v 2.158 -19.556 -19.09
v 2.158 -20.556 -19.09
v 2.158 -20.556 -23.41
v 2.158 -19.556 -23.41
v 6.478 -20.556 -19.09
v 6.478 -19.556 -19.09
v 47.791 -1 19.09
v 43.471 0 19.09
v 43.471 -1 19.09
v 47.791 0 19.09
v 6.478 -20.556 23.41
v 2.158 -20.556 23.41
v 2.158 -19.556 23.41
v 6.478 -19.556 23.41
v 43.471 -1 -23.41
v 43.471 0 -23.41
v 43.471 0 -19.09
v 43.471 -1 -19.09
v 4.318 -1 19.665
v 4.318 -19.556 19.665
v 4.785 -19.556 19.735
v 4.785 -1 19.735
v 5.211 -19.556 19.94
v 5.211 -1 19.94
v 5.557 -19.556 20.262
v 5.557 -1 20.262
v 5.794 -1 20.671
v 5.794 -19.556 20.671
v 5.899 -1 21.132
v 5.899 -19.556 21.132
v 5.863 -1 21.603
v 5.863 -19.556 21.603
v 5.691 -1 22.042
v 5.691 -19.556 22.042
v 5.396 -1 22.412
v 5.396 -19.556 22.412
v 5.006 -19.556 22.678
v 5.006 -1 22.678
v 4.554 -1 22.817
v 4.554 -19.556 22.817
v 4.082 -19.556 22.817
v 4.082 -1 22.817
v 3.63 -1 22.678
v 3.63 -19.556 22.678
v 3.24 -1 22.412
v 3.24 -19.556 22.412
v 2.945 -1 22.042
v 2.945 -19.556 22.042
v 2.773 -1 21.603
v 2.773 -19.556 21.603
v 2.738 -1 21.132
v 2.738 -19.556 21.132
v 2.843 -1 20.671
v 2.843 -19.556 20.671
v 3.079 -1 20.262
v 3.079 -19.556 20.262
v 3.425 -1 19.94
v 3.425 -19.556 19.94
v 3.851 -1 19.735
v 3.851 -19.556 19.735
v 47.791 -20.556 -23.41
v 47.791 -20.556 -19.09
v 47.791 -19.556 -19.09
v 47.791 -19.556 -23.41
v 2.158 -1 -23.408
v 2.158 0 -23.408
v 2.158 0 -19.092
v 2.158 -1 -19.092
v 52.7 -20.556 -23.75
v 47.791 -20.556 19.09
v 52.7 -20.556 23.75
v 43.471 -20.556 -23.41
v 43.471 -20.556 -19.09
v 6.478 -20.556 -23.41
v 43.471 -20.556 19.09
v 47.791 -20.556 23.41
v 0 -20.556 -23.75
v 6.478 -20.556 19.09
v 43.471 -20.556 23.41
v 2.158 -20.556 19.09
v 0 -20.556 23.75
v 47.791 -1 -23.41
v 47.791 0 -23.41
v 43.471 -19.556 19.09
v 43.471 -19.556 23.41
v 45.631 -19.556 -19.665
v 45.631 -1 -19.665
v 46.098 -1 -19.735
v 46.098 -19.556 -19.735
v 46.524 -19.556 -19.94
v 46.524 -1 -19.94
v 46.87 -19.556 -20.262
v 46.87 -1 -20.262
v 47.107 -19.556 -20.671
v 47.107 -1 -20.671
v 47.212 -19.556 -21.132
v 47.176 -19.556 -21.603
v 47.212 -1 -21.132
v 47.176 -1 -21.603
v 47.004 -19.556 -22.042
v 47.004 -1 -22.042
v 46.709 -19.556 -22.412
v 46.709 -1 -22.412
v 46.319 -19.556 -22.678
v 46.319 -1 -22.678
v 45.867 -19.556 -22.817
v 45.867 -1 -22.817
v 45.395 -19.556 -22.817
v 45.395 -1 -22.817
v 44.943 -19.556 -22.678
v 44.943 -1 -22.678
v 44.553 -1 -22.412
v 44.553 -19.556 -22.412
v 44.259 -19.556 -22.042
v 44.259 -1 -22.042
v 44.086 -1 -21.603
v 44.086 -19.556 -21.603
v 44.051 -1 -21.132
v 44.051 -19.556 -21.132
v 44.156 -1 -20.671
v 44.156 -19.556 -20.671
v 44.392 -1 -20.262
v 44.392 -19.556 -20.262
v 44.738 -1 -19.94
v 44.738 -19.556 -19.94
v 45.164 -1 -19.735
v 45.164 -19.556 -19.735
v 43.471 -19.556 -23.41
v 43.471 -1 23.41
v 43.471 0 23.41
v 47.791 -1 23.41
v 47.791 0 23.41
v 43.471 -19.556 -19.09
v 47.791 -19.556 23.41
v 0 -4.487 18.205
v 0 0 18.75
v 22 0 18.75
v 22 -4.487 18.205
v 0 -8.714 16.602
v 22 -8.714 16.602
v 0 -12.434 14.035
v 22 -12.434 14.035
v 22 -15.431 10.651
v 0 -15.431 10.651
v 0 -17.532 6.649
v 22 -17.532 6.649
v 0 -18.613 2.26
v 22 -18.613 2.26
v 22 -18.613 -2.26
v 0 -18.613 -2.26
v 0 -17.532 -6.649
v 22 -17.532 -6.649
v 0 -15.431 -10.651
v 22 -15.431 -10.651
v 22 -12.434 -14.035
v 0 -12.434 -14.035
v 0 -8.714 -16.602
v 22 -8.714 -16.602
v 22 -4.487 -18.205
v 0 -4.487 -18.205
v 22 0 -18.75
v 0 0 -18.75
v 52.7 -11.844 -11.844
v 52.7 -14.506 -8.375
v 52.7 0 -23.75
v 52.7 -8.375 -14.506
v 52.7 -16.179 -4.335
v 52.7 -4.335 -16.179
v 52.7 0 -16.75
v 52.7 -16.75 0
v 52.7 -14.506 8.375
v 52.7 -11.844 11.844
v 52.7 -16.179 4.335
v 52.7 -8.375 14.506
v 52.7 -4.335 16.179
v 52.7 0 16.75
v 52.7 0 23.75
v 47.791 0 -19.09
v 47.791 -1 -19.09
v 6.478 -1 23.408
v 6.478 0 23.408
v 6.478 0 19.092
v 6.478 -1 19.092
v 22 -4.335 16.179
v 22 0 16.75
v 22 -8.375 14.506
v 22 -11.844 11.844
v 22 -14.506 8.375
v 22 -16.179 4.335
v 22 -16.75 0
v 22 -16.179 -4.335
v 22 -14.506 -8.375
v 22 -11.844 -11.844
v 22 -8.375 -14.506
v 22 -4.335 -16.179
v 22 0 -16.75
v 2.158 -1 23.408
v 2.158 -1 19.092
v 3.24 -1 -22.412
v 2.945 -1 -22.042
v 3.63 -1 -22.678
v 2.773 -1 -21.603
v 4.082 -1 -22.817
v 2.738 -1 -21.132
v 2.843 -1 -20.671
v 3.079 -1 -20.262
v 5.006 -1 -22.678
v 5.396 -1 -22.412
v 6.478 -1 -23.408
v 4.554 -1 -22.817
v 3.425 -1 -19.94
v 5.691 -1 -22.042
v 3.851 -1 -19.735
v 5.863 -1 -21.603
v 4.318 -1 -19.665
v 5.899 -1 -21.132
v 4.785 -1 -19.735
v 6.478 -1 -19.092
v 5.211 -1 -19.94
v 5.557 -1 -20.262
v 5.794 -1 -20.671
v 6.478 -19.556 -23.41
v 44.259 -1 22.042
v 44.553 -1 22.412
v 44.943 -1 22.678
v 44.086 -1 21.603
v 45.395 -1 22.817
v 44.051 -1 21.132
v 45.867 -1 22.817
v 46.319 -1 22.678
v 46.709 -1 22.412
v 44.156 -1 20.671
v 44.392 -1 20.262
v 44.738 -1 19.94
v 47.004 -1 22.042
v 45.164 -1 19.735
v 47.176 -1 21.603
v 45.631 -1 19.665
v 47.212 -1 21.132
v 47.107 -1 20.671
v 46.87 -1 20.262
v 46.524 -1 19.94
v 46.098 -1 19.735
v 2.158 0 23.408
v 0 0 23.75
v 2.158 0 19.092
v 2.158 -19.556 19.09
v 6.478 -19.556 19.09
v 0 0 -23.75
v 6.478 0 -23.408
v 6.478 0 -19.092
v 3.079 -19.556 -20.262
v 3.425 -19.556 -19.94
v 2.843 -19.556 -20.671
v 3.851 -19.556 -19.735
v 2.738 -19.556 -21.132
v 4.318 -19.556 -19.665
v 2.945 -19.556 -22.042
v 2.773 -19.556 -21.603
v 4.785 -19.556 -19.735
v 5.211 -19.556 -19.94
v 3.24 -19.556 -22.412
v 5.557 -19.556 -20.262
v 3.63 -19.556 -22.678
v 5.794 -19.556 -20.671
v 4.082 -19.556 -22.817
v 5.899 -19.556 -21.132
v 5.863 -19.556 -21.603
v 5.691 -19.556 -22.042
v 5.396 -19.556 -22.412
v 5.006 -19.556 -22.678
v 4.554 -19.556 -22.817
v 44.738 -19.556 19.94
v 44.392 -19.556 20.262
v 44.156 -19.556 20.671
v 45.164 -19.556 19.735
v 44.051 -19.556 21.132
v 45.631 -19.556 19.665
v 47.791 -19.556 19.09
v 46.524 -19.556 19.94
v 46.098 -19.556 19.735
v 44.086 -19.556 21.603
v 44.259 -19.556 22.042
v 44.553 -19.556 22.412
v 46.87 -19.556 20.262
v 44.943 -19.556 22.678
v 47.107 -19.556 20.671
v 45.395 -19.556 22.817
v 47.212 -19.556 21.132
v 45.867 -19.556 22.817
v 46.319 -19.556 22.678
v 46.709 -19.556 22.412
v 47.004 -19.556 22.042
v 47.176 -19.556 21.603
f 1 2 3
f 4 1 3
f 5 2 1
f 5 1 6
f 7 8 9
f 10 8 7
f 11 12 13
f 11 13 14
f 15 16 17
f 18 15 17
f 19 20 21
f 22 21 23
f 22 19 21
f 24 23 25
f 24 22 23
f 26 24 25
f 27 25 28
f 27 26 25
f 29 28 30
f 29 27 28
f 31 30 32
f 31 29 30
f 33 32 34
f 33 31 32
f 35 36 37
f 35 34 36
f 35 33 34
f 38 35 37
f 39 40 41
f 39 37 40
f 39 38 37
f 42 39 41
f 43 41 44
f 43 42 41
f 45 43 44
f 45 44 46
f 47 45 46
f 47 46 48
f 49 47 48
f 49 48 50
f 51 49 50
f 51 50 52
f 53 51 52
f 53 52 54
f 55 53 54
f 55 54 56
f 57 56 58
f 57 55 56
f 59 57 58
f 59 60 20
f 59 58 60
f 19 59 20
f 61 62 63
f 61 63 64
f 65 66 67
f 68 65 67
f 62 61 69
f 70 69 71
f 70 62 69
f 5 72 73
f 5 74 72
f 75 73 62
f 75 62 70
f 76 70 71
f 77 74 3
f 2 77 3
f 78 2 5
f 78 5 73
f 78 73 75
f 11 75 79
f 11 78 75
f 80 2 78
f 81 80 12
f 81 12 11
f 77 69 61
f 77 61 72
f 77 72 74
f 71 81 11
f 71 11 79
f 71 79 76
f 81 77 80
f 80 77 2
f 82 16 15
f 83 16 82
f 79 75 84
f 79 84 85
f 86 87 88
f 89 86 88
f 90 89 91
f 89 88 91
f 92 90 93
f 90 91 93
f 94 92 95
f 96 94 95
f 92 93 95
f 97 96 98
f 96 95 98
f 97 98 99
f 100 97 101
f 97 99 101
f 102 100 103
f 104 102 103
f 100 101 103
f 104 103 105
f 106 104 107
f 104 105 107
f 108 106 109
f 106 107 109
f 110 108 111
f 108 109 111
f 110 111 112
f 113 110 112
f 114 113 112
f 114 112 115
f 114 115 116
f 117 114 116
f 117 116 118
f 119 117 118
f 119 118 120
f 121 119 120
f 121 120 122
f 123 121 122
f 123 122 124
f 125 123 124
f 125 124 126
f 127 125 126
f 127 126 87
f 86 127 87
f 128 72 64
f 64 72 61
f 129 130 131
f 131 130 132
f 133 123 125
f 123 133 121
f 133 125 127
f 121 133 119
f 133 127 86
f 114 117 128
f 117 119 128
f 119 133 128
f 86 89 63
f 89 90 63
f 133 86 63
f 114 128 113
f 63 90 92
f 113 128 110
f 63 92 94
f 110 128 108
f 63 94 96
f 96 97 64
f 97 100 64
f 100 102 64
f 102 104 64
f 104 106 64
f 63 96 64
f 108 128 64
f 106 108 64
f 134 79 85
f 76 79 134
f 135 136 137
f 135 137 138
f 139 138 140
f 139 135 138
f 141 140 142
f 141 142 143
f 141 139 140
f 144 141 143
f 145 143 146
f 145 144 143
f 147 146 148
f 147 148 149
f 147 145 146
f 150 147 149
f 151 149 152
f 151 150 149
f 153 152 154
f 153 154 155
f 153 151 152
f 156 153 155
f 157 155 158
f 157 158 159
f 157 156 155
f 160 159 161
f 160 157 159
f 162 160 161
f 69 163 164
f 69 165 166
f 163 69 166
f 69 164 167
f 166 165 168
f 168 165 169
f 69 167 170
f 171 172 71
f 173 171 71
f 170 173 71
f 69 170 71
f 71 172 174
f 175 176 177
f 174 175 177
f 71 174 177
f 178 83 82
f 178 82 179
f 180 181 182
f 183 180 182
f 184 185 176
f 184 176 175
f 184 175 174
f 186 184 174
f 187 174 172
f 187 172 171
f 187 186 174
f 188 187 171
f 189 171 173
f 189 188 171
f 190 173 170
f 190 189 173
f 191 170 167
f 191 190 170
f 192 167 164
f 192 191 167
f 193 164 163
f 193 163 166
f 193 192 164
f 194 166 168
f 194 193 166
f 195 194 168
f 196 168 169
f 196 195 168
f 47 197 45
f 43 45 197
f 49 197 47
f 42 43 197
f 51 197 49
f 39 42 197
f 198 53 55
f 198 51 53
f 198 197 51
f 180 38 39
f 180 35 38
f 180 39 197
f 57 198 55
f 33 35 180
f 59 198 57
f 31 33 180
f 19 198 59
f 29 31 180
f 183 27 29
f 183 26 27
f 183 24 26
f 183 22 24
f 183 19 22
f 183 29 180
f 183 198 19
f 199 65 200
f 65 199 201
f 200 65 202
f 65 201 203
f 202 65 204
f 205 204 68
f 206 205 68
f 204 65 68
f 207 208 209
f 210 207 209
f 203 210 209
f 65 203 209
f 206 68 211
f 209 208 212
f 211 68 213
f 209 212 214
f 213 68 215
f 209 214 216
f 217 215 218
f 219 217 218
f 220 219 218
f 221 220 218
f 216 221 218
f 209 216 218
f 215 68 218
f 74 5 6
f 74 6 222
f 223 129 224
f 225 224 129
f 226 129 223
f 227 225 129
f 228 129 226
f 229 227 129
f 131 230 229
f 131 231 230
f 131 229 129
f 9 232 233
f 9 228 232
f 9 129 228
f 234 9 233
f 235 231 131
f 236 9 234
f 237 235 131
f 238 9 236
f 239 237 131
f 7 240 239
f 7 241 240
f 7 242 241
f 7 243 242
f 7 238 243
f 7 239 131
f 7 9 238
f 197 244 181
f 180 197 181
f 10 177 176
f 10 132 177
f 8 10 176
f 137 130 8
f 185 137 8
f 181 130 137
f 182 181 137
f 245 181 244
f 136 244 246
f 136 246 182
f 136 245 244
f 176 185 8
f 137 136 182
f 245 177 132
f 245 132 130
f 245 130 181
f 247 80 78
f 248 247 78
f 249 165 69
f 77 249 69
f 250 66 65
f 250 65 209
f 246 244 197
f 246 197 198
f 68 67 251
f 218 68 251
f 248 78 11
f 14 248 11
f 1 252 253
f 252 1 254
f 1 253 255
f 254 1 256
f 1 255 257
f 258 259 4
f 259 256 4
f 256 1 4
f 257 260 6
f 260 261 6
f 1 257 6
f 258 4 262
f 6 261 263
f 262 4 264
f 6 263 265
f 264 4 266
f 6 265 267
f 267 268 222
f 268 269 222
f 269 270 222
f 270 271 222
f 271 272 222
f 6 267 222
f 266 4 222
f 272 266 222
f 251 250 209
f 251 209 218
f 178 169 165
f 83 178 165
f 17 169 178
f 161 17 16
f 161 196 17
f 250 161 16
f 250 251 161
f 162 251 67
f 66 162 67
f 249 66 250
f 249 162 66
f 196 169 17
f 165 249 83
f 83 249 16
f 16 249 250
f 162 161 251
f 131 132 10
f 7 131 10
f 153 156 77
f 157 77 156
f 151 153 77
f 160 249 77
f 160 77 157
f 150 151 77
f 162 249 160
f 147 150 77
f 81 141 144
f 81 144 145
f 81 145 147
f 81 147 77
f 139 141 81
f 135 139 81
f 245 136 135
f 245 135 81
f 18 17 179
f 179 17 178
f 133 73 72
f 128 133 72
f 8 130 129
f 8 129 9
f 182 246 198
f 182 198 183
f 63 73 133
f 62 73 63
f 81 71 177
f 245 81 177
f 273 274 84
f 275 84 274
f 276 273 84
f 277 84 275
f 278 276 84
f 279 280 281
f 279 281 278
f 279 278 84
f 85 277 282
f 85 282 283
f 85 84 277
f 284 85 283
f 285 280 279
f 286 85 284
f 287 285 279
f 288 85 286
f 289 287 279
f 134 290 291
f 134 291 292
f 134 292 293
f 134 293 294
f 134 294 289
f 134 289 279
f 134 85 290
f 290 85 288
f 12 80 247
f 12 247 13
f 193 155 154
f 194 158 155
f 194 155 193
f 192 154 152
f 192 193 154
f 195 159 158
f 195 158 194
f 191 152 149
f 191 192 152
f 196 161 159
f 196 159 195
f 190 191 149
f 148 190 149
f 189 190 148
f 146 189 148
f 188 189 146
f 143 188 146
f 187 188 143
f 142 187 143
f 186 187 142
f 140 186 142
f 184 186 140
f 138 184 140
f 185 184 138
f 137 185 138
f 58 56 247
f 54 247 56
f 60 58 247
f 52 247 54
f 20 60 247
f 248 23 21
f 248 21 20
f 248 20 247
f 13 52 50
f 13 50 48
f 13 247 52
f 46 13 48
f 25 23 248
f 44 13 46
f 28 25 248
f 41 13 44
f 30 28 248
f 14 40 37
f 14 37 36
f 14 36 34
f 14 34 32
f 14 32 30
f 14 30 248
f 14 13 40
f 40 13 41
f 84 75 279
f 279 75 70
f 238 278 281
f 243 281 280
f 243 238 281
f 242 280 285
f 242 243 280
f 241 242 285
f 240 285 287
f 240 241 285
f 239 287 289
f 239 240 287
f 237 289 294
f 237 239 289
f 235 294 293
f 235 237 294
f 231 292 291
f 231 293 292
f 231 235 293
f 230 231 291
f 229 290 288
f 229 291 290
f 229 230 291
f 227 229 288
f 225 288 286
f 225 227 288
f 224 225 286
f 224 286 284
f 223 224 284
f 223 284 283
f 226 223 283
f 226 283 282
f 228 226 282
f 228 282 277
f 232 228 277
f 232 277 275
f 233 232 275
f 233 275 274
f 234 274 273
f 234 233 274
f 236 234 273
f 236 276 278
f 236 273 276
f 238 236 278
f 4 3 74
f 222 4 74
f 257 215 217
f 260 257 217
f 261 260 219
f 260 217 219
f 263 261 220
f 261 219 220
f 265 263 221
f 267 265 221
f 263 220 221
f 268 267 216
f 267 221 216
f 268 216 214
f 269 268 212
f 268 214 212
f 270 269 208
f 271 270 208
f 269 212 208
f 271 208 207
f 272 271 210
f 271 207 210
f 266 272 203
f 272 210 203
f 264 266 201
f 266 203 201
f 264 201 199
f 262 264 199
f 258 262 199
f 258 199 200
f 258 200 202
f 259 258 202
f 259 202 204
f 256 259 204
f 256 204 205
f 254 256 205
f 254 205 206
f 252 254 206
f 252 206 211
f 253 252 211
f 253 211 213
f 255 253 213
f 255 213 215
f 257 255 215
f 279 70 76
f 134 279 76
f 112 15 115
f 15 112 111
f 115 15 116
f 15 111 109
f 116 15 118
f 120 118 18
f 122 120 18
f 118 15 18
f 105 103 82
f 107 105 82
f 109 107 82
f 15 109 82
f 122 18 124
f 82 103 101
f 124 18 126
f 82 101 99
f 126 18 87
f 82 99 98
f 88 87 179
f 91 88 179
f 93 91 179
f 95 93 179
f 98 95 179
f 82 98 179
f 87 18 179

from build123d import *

# Parameters (mm, degrees)
SALIENTE_EXTRUIR1_DEPTH = 22
SALIENTE_EXTRUIR2_DEPTH = 30.7
CORTAR_EXTRUIR2_REACH   = 63.351
CROQUIS4_R              = 1.585
CROQUIS5_W              = 4.32
CROQUIS5_H              = 4.315133256
CROQUIS5_H_2            = 4.32
CORTAR_EXTRUIR3_DEPTH   = 1
CROQUIS6_W              = 4.32
CROQUIS6_H              = 4.32
CORTAR_EXTRUIR4_DEPTH   = 1


with BuildPart() as part:
    # Croquis1 → Saliente-Extruir1 (new body)
    with BuildSketch(Plane(origin=(0, 0, 0), x_dir=(0, 0, -1), z_dir=(1, 0, 0))):
        with BuildLine():
            Line((-23.75, 0), (-18.75, 0))
            ThreePointArc((-18.75, 0), (0, -18.75), (18.75, 0))
            Line((18.75, 0), (23.75, 0))
            Line((23.75, 0), (23.75, -20.555666233))
            Line((23.75, -20.555666233), (-23.75, -20.555666233))
            Line((-23.75, -20.555666233), (-23.75, 0))
        make_face()
    extrude(amount=SALIENTE_EXTRUIR1_DEPTH)

    # Croquis2 → Saliente-Extruir2 (add)
    with BuildSketch(Plane(origin=(22, 0, 0), x_dir=(0, 0, -1), z_dir=(1, 0, 0))):
        with BuildLine():
            Line((16.75, 0), (23.75, 0))
            Line((23.75, 0), (23.75, -20.555666233))
            Line((23.75, -20.555666233), (-23.75, -20.555666233))
            Line((-23.75, -20.555666233), (-23.75, 0))
            Line((-23.75, 0), (-16.75, 0))
            ThreePointArc((-16.75, 0), (0, -16.75), (16.75, 0))
        make_face()
    extrude(amount=SALIENTE_EXTRUIR2_DEPTH)

    # Croquis4 → Cortar-Extruir2 (cut, up to next)
    with BuildSketch(Plane(origin=(0, 0, 0), x_dir=(1, 0, 0), z_dir=(0, 1, 0)), mode=Mode.PRIVATE) as cortar_extruir2_sk1:
        with Locations(Location((4.31807399, 21.25, 0), (0, 0, 270))):
            Circle(CROQUIS4_R)
    cortar_extruir2_tool1 = extrude(cortar_extruir2_sk1.sketch, amount=-CORTAR_EXTRUIR2_REACH, mode=Mode.PRIVATE) & part.part
    # Croquis4 → Cortar-Extruir2 (cut, up to next)
    with BuildSketch(Plane(origin=(0, 0, 0), x_dir=(1, 0, 0), z_dir=(0, 1, 0)), mode=Mode.PRIVATE) as cortar_extruir2_sk2:
        with Locations(Location((45.631200307, 21.25, 0), (0, 0, 270))):
            Circle(CROQUIS4_R)
    cortar_extruir2_tool2 = extrude(cortar_extruir2_sk2.sketch, amount=-CORTAR_EXTRUIR2_REACH, mode=Mode.PRIVATE) & part.part
    cortar_extruir2_1 = cortar_extruir2_tool1.solids().sort_by_distance((4.318074, 0, -21.25))[0]
    add(cortar_extruir2_1, mode=Mode.SUBTRACT)
    cortar_extruir2_2 = cortar_extruir2_tool2.solids().sort_by_distance((45.6312, 0, -21.25))[0]
    add(cortar_extruir2_2, mode=Mode.SUBTRACT)
    cortar_extruir2 = cortar_extruir2_1 + cortar_extruir2_2  # Cortar-Extruir2 as one shape, for the pattern or mirror that repeats it

    # Simetría1: Cortar-Extruir2 across plane
    add(cortar_extruir2.mirror(Plane.XY), mode=Mode.SUBTRACT)

    # Croquis5 → Cortar-Extruir3 (cut)
    with BuildSketch(Plane(origin=(0, 0, 0), x_dir=(1, 0, 0), z_dir=(0, 1, 0))):
        with Locations((4.31807399, -21.25)):
            Rectangle(CROQUIS5_W, CROQUIS5_H)
        with Locations((45.631200307, -21.25)):
            Rectangle(CROQUIS5_W, CROQUIS5_H_2)
    cortar_extruir3 = extrude(amount=-CORTAR_EXTRUIR3_DEPTH, mode=Mode.SUBTRACT)

    # Croquis6 → Cortar-Extruir4 (cut)
    with BuildSketch(Plane.XZ.offset(20.555666233)):
        with Locations((4.31807399, 21.25)):
            Rectangle(CROQUIS6_W, CROQUIS6_H)
        with Locations((45.631200307, 21.25)):
            Rectangle(CROQUIS6_W, CROQUIS6_H)
    cortar_extruir4 = extrude(amount=-CORTAR_EXTRUIR4_DEPTH, mode=Mode.SUBTRACT)

    # Simetría2: Cortar-Extruir3, Cortar-Extruir4 across plane
    add(cortar_extruir3.mirror(Plane.XY), mode=Mode.SUBTRACT)
    add(cortar_extruir4.mirror(Plane.XY), mode=Mode.SUBTRACT)


solid = part.part
